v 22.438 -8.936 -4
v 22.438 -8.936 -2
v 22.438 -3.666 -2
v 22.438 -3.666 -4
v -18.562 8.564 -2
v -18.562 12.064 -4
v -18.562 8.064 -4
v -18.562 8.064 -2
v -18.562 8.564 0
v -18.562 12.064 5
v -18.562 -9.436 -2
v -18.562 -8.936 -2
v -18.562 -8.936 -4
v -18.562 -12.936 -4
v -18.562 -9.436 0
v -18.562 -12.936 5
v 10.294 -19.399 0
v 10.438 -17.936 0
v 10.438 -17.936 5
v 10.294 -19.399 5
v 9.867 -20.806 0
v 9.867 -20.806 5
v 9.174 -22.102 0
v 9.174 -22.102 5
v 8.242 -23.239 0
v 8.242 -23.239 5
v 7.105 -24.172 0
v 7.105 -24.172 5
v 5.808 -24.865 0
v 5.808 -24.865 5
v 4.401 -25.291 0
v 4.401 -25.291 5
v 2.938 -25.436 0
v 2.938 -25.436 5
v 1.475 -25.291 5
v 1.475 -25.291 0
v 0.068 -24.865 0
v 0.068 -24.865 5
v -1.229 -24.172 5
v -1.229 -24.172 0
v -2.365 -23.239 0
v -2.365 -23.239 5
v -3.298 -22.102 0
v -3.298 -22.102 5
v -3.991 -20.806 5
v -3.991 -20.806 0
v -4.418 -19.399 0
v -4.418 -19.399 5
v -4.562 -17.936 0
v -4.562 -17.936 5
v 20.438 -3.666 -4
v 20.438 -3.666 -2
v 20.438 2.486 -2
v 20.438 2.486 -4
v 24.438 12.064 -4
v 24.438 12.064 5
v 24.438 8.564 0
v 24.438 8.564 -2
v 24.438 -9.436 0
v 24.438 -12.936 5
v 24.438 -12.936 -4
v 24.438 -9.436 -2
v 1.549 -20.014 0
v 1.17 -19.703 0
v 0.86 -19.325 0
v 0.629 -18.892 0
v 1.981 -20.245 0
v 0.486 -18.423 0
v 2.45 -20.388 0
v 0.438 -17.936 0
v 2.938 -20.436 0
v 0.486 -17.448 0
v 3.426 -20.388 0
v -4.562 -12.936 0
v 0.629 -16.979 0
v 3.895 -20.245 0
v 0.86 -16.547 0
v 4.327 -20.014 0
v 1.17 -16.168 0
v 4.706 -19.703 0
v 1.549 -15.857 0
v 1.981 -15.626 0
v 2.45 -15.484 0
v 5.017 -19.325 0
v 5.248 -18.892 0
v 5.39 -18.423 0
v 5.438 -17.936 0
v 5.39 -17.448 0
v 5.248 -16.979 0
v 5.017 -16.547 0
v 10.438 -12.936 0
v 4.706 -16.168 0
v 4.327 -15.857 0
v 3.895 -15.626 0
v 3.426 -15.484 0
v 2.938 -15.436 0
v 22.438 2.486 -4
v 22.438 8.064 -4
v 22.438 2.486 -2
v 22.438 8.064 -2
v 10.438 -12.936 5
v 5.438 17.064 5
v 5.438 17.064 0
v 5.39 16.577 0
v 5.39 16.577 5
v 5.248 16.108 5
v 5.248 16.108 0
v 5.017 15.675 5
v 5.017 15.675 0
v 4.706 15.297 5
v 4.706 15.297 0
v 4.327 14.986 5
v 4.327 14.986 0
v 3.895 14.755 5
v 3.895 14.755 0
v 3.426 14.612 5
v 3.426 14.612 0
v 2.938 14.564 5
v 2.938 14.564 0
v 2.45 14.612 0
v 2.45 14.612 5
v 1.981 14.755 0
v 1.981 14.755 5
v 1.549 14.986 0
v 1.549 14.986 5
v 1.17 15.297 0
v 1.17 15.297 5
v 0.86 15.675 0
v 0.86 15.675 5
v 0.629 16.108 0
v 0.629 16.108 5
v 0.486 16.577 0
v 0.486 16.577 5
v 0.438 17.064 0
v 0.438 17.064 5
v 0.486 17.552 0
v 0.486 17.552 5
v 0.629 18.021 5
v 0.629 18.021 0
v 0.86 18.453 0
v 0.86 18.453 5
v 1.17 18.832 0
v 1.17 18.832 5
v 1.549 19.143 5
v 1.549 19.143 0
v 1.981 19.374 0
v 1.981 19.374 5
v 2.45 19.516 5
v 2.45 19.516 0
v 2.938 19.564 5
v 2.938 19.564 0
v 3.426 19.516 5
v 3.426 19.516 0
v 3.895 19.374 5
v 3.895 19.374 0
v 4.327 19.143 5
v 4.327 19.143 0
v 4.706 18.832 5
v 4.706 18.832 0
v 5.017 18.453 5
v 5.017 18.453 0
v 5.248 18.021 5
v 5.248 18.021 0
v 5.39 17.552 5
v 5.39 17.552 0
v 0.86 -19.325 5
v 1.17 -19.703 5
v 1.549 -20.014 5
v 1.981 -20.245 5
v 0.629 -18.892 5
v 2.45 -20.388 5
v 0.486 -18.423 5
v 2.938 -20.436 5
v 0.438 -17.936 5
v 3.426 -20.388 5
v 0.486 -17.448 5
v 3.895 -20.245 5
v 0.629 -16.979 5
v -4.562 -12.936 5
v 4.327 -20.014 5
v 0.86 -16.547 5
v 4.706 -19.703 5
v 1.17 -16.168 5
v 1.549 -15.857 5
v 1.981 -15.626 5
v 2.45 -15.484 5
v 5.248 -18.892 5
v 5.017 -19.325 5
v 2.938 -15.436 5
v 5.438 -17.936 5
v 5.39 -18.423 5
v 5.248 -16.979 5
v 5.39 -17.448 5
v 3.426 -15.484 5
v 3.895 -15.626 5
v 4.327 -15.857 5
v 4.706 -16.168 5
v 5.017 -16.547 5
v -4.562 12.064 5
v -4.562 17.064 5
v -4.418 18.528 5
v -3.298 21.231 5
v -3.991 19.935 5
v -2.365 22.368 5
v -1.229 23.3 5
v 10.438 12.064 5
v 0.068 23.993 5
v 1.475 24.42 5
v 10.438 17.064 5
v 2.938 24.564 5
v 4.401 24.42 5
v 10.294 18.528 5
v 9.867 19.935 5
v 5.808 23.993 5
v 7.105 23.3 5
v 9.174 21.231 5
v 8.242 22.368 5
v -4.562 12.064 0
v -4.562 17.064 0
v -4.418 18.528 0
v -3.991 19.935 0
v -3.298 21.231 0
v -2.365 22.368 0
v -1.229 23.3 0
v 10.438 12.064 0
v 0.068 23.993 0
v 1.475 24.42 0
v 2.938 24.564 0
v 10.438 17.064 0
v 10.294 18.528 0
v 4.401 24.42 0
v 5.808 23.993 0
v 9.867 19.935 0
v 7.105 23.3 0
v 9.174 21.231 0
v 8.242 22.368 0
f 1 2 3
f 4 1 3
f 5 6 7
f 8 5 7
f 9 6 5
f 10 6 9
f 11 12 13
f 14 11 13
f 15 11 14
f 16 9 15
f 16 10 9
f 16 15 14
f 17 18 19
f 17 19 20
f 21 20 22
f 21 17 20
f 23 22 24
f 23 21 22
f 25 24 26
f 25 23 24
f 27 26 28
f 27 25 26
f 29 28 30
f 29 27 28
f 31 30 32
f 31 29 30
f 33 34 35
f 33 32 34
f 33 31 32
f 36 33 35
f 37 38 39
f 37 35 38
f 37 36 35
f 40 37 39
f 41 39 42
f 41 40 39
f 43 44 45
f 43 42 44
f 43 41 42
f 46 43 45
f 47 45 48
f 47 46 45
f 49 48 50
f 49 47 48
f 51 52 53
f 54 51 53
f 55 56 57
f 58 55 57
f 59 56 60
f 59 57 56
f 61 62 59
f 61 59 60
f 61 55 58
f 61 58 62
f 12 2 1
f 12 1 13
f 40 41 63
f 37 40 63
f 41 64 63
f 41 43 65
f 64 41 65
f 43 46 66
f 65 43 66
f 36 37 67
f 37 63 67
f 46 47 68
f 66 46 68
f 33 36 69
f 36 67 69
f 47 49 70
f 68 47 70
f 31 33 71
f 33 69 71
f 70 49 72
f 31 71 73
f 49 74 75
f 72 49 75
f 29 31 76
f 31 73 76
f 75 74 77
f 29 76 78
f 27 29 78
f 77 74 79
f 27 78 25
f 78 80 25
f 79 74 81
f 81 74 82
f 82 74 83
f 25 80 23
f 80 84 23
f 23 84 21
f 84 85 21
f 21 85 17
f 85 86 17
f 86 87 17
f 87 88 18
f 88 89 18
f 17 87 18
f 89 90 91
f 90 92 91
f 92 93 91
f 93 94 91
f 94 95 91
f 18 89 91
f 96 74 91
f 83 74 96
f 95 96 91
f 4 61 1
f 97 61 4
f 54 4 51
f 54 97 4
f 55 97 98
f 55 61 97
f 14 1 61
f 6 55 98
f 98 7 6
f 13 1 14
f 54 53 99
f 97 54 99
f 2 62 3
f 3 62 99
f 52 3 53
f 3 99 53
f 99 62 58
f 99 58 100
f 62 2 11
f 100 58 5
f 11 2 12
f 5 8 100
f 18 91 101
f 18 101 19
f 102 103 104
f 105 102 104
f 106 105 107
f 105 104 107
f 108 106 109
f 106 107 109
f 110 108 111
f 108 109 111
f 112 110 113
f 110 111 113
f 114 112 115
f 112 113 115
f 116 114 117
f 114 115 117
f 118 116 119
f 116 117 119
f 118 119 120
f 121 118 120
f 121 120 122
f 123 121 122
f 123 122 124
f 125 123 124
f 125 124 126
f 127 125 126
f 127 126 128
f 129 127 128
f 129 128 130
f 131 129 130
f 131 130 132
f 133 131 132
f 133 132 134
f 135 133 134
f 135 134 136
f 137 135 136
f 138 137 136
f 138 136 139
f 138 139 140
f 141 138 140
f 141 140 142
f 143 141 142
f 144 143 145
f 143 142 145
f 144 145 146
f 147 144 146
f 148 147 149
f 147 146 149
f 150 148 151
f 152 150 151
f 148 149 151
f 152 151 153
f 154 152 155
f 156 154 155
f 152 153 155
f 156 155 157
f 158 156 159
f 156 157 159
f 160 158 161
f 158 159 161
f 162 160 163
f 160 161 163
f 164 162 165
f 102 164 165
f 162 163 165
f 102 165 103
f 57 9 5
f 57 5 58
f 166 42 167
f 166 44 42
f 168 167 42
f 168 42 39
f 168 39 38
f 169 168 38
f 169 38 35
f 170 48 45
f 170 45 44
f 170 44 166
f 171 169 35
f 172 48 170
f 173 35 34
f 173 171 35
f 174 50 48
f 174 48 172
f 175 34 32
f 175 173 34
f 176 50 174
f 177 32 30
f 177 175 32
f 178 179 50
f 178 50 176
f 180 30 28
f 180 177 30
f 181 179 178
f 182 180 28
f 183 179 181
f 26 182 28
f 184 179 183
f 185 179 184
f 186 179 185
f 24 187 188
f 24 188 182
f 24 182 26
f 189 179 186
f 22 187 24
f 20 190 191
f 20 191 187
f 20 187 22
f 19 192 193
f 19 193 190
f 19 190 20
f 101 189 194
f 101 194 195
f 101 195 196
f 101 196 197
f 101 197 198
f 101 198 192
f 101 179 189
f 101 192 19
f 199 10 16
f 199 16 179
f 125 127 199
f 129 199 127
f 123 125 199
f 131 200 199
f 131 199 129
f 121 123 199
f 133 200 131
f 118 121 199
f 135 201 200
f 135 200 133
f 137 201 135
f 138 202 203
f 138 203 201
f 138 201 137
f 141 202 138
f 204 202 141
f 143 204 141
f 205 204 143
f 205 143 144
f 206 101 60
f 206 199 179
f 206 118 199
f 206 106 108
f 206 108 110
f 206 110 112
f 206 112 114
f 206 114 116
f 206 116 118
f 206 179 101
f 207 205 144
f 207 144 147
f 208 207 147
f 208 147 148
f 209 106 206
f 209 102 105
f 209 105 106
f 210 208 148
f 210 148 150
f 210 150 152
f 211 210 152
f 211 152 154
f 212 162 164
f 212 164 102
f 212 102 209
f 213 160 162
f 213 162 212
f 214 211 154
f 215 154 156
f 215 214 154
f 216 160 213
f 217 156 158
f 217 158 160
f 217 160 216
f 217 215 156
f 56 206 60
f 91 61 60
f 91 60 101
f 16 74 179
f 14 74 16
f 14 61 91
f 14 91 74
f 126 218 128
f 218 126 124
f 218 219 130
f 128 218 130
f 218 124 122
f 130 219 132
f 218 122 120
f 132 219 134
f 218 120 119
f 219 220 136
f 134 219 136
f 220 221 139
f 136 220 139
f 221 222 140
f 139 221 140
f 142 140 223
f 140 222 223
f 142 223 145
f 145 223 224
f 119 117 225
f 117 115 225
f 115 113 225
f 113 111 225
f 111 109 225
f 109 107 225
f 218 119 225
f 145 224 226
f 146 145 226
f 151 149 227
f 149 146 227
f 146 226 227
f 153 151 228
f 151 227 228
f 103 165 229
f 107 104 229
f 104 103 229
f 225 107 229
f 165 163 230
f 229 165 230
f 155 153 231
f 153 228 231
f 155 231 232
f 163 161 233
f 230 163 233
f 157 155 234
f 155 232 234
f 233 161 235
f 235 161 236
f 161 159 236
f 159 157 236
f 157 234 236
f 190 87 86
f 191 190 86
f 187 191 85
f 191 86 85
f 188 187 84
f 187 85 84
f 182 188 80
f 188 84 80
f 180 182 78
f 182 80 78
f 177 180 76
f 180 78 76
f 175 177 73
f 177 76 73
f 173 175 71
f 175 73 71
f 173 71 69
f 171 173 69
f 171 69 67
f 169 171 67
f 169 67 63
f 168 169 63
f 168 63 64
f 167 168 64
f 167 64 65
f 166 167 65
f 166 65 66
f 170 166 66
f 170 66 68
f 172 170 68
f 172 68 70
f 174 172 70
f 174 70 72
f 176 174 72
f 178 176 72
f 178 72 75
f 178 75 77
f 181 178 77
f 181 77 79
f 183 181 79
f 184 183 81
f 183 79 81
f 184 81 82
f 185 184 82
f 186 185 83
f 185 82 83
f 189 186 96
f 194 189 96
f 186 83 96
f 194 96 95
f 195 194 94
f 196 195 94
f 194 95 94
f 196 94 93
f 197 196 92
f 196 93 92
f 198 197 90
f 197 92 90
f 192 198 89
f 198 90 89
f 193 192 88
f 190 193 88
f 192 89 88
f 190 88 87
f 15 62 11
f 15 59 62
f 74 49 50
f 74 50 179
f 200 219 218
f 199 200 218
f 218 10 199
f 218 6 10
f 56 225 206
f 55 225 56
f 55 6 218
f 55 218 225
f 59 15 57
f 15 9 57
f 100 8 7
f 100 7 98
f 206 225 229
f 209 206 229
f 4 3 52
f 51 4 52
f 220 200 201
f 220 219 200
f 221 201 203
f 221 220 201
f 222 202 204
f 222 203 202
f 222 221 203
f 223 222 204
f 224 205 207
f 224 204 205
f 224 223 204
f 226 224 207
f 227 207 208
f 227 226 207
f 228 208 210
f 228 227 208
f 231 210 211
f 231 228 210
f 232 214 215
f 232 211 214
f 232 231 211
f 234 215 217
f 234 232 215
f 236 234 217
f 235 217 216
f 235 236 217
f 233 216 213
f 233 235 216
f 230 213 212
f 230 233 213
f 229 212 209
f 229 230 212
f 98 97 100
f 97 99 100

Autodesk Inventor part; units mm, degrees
ref_plane "YZ Plane" through (0, 0, 0) normal (1, 0, 0) x (0, 1, 0)
ref_plane "XZ Plane" through (0, 0, 0) normal (0, 1, 0) x (-1, 0, 0)
ref_plane "XY Plane" through (0, 0, 0) normal (0, 0, 1) x (1, 0, 0)
sketch "Sketch1" plane through (0, 0, 0) normal (0, 0, 1) x (1, 0, 0)
  line L0 (24.4382, -12.9356) -> (-18.5618, -12.9356)
  line L1 (-18.5618, -12.9356) -> (-18.5618, 12.0644)
  line L2 (-18.5618, 12.0644) -> (24.4382, 12.0644)
  line L3 (24.4382, 12.0644) -> (24.4382, -12.9356)
  line L4 (-4.5618, -12.9356) -> (10.4382, -12.9356)
  line L5 (10.4382, -12.9356) -> (10.4382, -17.9356)
  line L6 (10.4382, -17.9356) -> (-4.5618, -17.9356)
  line L7 (-4.5618, -17.9356) -> (-4.5618, -12.9356)
  line L8 (-4.5618, 12.0644) -> (10.4382, 12.0644)
  line L9 (10.4382, 12.0644) -> (10.4382, 17.0644)
  line L10 (10.4382, 17.0644) -> (-4.5618, 17.0644)
  line L11 (-4.5618, 17.0644) -> (-4.5618, 12.0644)
  circle A0 centre (2.9382, -17.9356) radius 7.5
  circle A1 centre (2.9382, 17.0644) radius 7.5
  circle A2 centre (2.9382, -17.9356) radius 2.5
  circle A3 centre (2.9382, 17.0644) radius 2.5
  point P0 (0, 0)
  point P1 (-4.5618, -17.9356)
  dimension "d0" = 43
  dimension "d1" = 25
  dimension "d2" = 15
  dimension "d3" = 15
  dimension "d4" = 21.5
  dimension "d5" = 21.5
  dimension "d6" = 5
  dimension "d7" = 5
  dimension "d8" = 5
  dimension "d9" = 5
extrude "Extrusion1" add sketch "Sketch1" along normal blind 5 contours L0 A0 L1 L2 A1 L3 | L5 A0 L0 | A0 L6 A2 L0 | L0 A0 | A0 L6 A2 | L2 A1 L9 | A0 L7 L0 | A1 L2 | L2 A1 L10 A3 | L10 A3 A1 | L2 L11 A1
sketch "Sketch2" plane through (0, 0, 0) normal (0, 0, -1) x (-1, 0, 0)
  line L0 (18.5618, 12.0644) -> (18.5618, -12.9356) projected
  line L1 (-24.4382, -12.9356) -> (-24.4382, 12.0644) projected
  line L2 (18.5618, -12.9356) -> (-24.4382, -12.9356)
  line L3 (-24.4382, -12.9356) -> (-24.4382, -9.4356)
  line L4 (-24.4382, -9.4356) -> (18.5618, -9.4356)
  line L5 (18.5618, -9.4356) -> (18.5618, -12.9356)
  line L6 (-24.4382, 12.0644) -> (18.5618, 12.0644)
  line L7 (18.5618, 12.0644) -> (18.5618, 8.5644)
  line L8 (18.5618, 8.5644) -> (-24.4382, 8.5644)
  line L9 (-24.4382, 8.5644) -> (-24.4382, 12.0644)
  point P0 (0, 0)
  point P1 (-24.4382, 8.5644)
  point P2 (18.5618, -9.4356)
  dimension "d12" = 3.5
  dimension "d13" = 3.5
extrude "Extrusion2" add sketch "Sketch2" along normal blind 2 contours L0 L8 L1 L6 | L0 L2 L1 L4
sketch "Sketch3" plane through (0, 0, -2) normal (0, 0, -1) x (-1, 0, 0)
  line L0 (-24.4382, -12.9356) -> (18.5618, -12.9356) projected
  line L1 (-24.4382, -9.4356) -> (-24.4382, 8.5644) projected
  line L2 (18.5618, -12.9356) -> (-24.4382, -12.9356)
  line L3 (-24.4382, -12.9356) -> (-24.4382, -8.9356)
  line L4 (-24.4382, -8.9356) -> (18.5618, -8.9356)
  line L5 (18.5618, -8.9356) -> (18.5618, -12.9356)
  line L6 (-24.4382, 12.0644) -> (18.5618, 12.0644)
  line L7 (18.5618, 12.0644) -> (18.5618, 8.0644)
  line L8 (18.5618, 8.0644) -> (-24.4382, 8.0644)
  line L9 (-24.4382, 8.0644) -> (-24.4382, 12.0644)
  line L10 (-24.4382, -8.9356) -> (-22.4382, -8.9356)
  line L11 (-22.4382, -8.9356) -> (-22.4382, 8.0644)
  line L12 (-22.4382, 8.0644) -> (-24.4382, 8.0644)
  line L13 (-24.4382, 8.0644) -> (-24.4382, -8.9356)
  line L14 (-22.4382, -3.6663) -> (-20.4382, -3.6663)
  line L15 (-20.4382, -3.6663) -> (-20.4382, 2.486)
  line L16 (-20.4382, 2.486) -> (-22.4382, 2.486)
  line L17 (-22.4382, 2.486) -> (-22.4382, -3.6663)
  line L18 (18.5618, 12.0644) -> (-24.4382, 12.0644) projected
  point P0 (0, 0)
  dimension "d16" = 4
  dimension "d17" = 4
  dimension "d18" = 0
  dimension "d19" = 2
  dimension "d20" = 2
extrude "Extrusion3" add sketch "Sketch3" along normal blind 2
equation "\"d4\" = 0.5 * d0"
equation "\"d5\" = d4"
equation "\"d9\" = d8"
equation "\"d12\" = d13"
properties part number "RelayBracket"
